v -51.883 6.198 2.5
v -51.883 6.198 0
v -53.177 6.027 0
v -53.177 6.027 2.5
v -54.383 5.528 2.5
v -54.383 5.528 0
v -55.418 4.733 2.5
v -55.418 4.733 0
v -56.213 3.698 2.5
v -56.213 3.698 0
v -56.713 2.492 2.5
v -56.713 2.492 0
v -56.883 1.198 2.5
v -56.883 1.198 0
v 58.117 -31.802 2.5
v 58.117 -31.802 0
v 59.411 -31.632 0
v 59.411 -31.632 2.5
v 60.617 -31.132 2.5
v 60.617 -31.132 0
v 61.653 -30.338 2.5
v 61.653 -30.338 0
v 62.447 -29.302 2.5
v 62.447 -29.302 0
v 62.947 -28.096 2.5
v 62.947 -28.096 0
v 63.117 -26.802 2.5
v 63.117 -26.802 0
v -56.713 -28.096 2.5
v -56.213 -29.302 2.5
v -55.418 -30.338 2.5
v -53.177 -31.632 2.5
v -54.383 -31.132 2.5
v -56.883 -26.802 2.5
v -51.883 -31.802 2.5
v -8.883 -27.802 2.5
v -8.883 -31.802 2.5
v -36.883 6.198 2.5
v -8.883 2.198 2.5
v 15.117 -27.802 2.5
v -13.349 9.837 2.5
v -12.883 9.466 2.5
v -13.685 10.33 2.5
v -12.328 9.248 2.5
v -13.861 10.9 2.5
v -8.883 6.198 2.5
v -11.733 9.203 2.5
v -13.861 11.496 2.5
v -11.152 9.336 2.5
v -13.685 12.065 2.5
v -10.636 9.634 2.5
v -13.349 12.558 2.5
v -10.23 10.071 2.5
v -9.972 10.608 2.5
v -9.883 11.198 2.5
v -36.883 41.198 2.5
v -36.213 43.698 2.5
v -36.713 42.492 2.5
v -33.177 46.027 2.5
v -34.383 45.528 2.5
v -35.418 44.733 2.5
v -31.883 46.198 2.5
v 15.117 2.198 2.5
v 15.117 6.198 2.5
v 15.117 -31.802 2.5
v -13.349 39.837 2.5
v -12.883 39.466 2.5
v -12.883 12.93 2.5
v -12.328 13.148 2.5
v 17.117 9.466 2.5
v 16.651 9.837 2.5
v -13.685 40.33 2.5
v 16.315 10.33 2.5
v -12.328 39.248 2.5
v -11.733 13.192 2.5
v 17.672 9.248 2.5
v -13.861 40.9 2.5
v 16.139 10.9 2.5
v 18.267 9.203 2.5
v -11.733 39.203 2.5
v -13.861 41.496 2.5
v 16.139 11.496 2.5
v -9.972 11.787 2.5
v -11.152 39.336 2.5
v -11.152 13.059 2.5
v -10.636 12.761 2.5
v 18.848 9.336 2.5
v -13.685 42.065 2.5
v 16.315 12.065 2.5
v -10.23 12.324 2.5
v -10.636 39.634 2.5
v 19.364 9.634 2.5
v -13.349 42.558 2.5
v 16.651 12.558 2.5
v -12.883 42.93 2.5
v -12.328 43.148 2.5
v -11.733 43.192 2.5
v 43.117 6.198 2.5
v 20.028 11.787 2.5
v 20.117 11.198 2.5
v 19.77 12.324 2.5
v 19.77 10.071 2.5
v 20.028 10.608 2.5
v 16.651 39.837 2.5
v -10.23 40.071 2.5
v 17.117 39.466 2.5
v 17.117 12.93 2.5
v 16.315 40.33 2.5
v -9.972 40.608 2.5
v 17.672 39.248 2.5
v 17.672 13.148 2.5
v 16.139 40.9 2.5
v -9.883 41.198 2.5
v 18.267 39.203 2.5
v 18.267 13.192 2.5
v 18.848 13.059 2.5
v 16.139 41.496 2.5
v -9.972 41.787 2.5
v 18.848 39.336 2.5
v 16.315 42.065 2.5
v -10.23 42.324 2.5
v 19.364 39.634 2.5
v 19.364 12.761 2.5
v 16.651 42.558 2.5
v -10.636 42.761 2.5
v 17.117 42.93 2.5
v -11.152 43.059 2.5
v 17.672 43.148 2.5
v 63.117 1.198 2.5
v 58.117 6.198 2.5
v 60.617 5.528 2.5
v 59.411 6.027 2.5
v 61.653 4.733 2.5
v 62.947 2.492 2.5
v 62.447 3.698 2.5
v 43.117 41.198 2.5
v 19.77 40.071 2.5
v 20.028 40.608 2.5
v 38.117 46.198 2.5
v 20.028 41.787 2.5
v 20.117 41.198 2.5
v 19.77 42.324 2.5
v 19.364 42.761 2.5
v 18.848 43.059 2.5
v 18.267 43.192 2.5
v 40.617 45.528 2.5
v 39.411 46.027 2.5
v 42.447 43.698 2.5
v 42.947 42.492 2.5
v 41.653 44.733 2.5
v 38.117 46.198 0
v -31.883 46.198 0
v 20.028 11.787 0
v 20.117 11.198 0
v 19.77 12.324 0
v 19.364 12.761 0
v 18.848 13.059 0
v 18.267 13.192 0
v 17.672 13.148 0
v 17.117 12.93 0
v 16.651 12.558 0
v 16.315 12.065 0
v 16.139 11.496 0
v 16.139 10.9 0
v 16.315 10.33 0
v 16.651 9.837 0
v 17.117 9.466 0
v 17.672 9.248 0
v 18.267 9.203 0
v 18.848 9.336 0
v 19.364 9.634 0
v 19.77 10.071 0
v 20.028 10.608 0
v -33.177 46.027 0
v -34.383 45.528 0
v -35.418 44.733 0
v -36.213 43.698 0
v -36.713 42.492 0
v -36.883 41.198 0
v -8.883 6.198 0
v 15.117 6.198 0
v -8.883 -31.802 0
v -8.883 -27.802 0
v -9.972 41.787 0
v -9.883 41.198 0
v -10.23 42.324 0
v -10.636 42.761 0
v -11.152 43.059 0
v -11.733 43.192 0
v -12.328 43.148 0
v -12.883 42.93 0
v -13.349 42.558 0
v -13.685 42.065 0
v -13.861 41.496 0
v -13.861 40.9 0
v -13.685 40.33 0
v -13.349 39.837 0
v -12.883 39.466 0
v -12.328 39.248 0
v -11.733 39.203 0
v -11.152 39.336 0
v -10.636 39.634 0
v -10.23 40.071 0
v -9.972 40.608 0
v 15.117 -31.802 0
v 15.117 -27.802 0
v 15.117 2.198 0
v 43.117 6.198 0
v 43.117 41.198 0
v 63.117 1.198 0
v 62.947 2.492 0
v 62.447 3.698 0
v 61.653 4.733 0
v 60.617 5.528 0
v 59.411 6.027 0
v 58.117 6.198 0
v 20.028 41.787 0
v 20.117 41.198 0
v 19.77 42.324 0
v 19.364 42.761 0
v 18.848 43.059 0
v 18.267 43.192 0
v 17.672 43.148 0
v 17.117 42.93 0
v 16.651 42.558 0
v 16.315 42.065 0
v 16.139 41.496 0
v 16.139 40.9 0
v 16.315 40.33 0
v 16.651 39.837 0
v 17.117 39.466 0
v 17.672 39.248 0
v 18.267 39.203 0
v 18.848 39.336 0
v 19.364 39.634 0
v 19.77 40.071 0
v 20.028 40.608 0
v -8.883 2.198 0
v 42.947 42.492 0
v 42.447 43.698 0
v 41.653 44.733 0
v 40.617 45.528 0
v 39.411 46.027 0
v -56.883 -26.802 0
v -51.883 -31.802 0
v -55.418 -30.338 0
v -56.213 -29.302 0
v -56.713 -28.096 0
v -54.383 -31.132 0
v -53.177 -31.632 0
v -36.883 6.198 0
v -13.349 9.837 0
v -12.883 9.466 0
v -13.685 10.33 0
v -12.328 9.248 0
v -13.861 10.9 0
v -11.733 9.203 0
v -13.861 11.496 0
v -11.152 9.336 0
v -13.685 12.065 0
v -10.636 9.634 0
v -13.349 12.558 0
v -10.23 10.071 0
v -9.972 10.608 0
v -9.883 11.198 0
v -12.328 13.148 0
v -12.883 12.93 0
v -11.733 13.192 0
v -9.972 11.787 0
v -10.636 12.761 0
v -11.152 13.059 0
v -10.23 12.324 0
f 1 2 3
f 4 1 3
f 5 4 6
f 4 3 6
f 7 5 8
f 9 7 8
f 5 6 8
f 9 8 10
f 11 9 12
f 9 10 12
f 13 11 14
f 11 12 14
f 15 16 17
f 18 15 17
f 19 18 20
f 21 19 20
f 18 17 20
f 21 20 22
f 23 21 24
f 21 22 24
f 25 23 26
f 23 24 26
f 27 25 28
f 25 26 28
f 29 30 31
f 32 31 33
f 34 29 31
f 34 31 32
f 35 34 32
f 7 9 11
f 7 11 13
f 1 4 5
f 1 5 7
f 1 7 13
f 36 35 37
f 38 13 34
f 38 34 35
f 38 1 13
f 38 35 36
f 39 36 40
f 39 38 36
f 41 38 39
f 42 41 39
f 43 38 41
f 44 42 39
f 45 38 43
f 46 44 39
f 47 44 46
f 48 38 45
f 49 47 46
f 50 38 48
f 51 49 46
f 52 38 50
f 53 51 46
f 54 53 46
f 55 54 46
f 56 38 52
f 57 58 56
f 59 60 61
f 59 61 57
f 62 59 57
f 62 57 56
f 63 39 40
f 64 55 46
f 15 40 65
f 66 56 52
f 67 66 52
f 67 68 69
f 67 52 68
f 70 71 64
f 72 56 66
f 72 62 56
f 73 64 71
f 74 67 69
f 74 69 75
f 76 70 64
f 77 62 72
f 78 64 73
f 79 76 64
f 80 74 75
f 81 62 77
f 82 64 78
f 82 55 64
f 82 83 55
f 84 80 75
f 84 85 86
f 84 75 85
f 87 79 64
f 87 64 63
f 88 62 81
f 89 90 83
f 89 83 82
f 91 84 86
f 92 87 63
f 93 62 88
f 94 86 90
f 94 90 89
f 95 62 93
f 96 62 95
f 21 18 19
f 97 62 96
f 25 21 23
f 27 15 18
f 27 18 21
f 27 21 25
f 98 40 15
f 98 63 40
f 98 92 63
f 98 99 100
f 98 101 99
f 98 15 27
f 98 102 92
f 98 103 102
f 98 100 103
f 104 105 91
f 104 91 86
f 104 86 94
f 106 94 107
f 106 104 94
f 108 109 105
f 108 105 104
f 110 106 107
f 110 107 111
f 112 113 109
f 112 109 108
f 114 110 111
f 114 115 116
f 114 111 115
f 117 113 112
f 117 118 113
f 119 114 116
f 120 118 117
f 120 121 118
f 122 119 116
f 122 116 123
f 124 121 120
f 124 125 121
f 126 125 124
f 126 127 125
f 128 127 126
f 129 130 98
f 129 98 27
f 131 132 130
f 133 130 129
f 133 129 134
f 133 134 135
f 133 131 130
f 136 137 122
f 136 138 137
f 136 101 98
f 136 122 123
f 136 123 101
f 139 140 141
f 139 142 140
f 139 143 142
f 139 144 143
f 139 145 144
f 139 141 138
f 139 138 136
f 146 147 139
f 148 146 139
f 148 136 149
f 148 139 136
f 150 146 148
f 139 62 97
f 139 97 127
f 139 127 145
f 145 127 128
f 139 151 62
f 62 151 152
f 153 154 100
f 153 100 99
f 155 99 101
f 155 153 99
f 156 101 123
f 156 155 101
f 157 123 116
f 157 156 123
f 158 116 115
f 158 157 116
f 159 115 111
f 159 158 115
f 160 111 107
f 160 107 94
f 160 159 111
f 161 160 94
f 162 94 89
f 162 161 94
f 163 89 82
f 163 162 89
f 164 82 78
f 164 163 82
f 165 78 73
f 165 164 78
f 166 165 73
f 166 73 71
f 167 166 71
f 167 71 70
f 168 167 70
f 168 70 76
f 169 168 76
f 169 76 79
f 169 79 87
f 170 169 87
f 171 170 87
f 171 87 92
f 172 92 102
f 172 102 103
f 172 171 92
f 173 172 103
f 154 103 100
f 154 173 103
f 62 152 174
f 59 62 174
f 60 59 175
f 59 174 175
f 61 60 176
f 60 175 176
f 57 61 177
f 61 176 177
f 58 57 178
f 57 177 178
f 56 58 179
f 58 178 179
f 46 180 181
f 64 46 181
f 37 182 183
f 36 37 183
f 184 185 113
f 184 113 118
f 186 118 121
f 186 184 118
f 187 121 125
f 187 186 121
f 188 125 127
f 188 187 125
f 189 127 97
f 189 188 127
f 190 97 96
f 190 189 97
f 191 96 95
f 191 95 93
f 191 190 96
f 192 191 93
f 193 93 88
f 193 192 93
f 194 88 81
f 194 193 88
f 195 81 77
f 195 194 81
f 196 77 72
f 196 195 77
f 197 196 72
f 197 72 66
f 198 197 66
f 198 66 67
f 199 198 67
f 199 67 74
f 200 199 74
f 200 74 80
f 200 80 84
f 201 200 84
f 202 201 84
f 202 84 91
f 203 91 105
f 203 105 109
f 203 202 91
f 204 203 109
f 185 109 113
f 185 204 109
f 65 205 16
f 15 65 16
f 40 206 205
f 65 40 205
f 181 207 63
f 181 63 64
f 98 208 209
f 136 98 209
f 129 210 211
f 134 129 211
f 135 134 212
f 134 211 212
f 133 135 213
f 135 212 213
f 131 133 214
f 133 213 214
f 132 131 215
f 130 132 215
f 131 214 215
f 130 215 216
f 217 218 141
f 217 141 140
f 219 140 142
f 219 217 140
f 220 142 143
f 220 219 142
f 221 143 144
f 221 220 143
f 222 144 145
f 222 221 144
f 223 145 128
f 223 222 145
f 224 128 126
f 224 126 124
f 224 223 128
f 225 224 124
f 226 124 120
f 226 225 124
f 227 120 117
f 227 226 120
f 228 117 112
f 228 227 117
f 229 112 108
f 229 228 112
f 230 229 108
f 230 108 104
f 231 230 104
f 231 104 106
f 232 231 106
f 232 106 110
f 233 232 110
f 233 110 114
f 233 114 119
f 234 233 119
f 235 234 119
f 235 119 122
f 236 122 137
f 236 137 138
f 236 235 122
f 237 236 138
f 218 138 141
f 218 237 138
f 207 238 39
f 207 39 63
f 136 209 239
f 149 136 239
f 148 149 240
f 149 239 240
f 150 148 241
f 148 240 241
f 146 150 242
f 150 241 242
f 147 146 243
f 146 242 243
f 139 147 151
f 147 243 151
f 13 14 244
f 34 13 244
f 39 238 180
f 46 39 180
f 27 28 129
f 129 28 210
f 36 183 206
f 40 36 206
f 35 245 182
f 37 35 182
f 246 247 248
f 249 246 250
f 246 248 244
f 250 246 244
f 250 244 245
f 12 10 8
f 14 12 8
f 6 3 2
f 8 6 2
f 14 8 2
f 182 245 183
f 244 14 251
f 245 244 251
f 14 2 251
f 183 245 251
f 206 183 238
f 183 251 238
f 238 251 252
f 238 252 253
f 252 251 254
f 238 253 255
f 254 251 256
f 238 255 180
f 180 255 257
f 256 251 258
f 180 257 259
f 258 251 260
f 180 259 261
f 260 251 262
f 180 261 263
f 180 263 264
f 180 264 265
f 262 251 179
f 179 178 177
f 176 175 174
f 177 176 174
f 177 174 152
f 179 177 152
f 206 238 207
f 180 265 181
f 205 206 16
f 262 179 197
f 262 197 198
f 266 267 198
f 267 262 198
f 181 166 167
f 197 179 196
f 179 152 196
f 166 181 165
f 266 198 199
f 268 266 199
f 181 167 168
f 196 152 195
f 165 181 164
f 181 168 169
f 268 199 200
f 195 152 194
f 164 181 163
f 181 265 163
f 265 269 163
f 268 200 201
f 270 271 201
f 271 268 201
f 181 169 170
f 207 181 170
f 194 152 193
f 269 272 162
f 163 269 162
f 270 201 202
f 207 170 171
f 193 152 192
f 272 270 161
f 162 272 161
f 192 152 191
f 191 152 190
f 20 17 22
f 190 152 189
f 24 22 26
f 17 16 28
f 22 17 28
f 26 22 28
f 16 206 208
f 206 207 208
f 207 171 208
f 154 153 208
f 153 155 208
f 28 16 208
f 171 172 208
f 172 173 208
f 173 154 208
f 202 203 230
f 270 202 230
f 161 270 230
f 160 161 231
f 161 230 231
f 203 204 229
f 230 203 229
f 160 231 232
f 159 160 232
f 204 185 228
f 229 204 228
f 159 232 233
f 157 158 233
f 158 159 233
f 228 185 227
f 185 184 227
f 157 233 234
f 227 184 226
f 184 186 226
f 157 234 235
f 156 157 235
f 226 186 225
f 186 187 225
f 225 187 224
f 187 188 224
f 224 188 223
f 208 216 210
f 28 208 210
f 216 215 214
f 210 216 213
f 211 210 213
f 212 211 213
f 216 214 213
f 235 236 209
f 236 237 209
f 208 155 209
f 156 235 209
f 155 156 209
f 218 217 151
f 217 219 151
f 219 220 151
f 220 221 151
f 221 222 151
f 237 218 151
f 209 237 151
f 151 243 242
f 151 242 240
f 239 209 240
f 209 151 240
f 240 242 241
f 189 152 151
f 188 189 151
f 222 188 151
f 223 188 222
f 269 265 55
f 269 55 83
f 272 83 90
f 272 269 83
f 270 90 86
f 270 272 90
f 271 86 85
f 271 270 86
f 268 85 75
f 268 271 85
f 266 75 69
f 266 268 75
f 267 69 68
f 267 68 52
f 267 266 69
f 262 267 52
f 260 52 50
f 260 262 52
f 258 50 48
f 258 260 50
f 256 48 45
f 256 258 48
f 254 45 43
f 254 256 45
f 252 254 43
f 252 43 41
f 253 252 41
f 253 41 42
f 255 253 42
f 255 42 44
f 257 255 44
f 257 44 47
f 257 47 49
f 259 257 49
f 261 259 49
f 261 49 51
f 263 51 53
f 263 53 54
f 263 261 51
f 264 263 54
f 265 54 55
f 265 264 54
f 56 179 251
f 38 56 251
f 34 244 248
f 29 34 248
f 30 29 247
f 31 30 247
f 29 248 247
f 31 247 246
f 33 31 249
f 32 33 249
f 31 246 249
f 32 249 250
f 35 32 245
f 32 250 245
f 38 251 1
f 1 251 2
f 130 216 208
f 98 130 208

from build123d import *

# Parameters (mm, degrees)
F0_W     = 24
F0_H     = 4
F0_R     = 2
F1_DEPTH = 2.5


with BuildPart() as f1:
    # F0 (on Top) → F1 (new body)
    with BuildSketch(Plane.XY):
        with BuildLine():
            Line((-36.882881, 6.197646), (-51.882881, 6.197646))
            ThreePointArc((-51.882881, 6.197646), (-55.418415, 4.73318), (-56.882881, 1.197646))
            Line((-56.882881, 1.197646), (-56.882881, -26.802354))
            ThreePointArc((-56.882881, -26.802354), (-55.418415, -30.337887), (-51.882881, -31.802354))
            Line((-51.882881, -31.802354), (-8.882881, -31.802354))
            Line((-8.882881, -31.802354), (-8.882881, -27.802354))
            Line((-8.882881, -27.802354), (15.117119, -27.802354))
            Line((15.117119, -27.802354), (15.117119, -31.802354))
            Line((15.117119, -31.802354), (58.117119, -31.802354))
            ThreePointArc((58.117119, -31.802354), (61.652653, -30.337887), (63.117119, -26.802354))
            Line((63.117119, -26.802354), (63.117119, 1.197646))
            ThreePointArc((63.117119, 1.197646), (61.652653, 4.73318), (58.117119, 6.197646))
            Line((58.117119, 6.197646), (43.117119, 6.197646))
            Line((43.117119, 6.197646), (23.117119, 6.197646))
            Line((23.117119, 6.197646), (23.117119, 41.197646))
            ThreePointArc((23.117119, 41.197646), (21.652653, 44.73318), (18.117119, 46.197646))
            Line((18.117119, 46.197646), (-11.882881, 46.197646))
            ThreePointArc((-11.882881, 46.197646), (-15.418415, 44.73318), (-16.882881, 41.197646))
            Line((-16.882881, 41.197646), (-16.882881, 6.197646))
            Line((-16.882881, 6.197646), (-36.882881, 6.197646))
        make_face()
        with Locations((3.117119, 4.197646)):
            Rectangle(F0_W, F0_H, mode=Mode.SUBTRACT)
        with Locations((-11.882881, 11.197646)):
            Circle(F0_R, mode=Mode.SUBTRACT)
        with Locations((-11.882881, 41.197646)):
            Circle(F0_R, mode=Mode.SUBTRACT)
        with Locations((18.117119, 11.197646)):
            Circle(F0_R, mode=Mode.SUBTRACT)
        with Locations((18.117119, 41.197646)):
            Circle(F0_R, mode=Mode.SUBTRACT)
        with BuildLine():
            Line((-36.882881, 41.197646), (-36.882881, 6.197646))
            Line((-36.882881, 6.197646), (-16.882881, 6.197646))
            Line((-16.882881, 6.197646), (-16.882881, 41.197646))
            ThreePointArc((-16.882881, 41.197646), (-15.418415, 44.73318), (-11.882881, 46.197646))
            Line((-11.882881, 46.197646), (-16.882881, 46.197646))
            Line((-16.882881, 46.197646), (-31.882881, 46.197646))
            ThreePointArc((-31.882881, 46.197646), (-35.418415, 44.73318), (-36.882881, 41.197646))
        make_face()
        with BuildLine():
            Line((23.117119, 46.197646), (18.117119, 46.197646))
            ThreePointArc((18.117119, 46.197646), (21.652653, 44.73318), (23.117119, 41.197646))
            Line((23.117119, 41.197646), (23.117119, 6.197646))
            Line((23.117119, 6.197646), (43.117119, 6.197646))
            Line((43.117119, 6.197646), (43.117119, 41.197646))
            ThreePointArc((43.117119, 41.197646), (41.652653, 44.73318), (38.117119, 46.197646))
            Line((38.117119, 46.197646), (23.117119, 46.197646))
        make_face()
    extrude(amount=F1_DEPTH)


solid = f1.part
